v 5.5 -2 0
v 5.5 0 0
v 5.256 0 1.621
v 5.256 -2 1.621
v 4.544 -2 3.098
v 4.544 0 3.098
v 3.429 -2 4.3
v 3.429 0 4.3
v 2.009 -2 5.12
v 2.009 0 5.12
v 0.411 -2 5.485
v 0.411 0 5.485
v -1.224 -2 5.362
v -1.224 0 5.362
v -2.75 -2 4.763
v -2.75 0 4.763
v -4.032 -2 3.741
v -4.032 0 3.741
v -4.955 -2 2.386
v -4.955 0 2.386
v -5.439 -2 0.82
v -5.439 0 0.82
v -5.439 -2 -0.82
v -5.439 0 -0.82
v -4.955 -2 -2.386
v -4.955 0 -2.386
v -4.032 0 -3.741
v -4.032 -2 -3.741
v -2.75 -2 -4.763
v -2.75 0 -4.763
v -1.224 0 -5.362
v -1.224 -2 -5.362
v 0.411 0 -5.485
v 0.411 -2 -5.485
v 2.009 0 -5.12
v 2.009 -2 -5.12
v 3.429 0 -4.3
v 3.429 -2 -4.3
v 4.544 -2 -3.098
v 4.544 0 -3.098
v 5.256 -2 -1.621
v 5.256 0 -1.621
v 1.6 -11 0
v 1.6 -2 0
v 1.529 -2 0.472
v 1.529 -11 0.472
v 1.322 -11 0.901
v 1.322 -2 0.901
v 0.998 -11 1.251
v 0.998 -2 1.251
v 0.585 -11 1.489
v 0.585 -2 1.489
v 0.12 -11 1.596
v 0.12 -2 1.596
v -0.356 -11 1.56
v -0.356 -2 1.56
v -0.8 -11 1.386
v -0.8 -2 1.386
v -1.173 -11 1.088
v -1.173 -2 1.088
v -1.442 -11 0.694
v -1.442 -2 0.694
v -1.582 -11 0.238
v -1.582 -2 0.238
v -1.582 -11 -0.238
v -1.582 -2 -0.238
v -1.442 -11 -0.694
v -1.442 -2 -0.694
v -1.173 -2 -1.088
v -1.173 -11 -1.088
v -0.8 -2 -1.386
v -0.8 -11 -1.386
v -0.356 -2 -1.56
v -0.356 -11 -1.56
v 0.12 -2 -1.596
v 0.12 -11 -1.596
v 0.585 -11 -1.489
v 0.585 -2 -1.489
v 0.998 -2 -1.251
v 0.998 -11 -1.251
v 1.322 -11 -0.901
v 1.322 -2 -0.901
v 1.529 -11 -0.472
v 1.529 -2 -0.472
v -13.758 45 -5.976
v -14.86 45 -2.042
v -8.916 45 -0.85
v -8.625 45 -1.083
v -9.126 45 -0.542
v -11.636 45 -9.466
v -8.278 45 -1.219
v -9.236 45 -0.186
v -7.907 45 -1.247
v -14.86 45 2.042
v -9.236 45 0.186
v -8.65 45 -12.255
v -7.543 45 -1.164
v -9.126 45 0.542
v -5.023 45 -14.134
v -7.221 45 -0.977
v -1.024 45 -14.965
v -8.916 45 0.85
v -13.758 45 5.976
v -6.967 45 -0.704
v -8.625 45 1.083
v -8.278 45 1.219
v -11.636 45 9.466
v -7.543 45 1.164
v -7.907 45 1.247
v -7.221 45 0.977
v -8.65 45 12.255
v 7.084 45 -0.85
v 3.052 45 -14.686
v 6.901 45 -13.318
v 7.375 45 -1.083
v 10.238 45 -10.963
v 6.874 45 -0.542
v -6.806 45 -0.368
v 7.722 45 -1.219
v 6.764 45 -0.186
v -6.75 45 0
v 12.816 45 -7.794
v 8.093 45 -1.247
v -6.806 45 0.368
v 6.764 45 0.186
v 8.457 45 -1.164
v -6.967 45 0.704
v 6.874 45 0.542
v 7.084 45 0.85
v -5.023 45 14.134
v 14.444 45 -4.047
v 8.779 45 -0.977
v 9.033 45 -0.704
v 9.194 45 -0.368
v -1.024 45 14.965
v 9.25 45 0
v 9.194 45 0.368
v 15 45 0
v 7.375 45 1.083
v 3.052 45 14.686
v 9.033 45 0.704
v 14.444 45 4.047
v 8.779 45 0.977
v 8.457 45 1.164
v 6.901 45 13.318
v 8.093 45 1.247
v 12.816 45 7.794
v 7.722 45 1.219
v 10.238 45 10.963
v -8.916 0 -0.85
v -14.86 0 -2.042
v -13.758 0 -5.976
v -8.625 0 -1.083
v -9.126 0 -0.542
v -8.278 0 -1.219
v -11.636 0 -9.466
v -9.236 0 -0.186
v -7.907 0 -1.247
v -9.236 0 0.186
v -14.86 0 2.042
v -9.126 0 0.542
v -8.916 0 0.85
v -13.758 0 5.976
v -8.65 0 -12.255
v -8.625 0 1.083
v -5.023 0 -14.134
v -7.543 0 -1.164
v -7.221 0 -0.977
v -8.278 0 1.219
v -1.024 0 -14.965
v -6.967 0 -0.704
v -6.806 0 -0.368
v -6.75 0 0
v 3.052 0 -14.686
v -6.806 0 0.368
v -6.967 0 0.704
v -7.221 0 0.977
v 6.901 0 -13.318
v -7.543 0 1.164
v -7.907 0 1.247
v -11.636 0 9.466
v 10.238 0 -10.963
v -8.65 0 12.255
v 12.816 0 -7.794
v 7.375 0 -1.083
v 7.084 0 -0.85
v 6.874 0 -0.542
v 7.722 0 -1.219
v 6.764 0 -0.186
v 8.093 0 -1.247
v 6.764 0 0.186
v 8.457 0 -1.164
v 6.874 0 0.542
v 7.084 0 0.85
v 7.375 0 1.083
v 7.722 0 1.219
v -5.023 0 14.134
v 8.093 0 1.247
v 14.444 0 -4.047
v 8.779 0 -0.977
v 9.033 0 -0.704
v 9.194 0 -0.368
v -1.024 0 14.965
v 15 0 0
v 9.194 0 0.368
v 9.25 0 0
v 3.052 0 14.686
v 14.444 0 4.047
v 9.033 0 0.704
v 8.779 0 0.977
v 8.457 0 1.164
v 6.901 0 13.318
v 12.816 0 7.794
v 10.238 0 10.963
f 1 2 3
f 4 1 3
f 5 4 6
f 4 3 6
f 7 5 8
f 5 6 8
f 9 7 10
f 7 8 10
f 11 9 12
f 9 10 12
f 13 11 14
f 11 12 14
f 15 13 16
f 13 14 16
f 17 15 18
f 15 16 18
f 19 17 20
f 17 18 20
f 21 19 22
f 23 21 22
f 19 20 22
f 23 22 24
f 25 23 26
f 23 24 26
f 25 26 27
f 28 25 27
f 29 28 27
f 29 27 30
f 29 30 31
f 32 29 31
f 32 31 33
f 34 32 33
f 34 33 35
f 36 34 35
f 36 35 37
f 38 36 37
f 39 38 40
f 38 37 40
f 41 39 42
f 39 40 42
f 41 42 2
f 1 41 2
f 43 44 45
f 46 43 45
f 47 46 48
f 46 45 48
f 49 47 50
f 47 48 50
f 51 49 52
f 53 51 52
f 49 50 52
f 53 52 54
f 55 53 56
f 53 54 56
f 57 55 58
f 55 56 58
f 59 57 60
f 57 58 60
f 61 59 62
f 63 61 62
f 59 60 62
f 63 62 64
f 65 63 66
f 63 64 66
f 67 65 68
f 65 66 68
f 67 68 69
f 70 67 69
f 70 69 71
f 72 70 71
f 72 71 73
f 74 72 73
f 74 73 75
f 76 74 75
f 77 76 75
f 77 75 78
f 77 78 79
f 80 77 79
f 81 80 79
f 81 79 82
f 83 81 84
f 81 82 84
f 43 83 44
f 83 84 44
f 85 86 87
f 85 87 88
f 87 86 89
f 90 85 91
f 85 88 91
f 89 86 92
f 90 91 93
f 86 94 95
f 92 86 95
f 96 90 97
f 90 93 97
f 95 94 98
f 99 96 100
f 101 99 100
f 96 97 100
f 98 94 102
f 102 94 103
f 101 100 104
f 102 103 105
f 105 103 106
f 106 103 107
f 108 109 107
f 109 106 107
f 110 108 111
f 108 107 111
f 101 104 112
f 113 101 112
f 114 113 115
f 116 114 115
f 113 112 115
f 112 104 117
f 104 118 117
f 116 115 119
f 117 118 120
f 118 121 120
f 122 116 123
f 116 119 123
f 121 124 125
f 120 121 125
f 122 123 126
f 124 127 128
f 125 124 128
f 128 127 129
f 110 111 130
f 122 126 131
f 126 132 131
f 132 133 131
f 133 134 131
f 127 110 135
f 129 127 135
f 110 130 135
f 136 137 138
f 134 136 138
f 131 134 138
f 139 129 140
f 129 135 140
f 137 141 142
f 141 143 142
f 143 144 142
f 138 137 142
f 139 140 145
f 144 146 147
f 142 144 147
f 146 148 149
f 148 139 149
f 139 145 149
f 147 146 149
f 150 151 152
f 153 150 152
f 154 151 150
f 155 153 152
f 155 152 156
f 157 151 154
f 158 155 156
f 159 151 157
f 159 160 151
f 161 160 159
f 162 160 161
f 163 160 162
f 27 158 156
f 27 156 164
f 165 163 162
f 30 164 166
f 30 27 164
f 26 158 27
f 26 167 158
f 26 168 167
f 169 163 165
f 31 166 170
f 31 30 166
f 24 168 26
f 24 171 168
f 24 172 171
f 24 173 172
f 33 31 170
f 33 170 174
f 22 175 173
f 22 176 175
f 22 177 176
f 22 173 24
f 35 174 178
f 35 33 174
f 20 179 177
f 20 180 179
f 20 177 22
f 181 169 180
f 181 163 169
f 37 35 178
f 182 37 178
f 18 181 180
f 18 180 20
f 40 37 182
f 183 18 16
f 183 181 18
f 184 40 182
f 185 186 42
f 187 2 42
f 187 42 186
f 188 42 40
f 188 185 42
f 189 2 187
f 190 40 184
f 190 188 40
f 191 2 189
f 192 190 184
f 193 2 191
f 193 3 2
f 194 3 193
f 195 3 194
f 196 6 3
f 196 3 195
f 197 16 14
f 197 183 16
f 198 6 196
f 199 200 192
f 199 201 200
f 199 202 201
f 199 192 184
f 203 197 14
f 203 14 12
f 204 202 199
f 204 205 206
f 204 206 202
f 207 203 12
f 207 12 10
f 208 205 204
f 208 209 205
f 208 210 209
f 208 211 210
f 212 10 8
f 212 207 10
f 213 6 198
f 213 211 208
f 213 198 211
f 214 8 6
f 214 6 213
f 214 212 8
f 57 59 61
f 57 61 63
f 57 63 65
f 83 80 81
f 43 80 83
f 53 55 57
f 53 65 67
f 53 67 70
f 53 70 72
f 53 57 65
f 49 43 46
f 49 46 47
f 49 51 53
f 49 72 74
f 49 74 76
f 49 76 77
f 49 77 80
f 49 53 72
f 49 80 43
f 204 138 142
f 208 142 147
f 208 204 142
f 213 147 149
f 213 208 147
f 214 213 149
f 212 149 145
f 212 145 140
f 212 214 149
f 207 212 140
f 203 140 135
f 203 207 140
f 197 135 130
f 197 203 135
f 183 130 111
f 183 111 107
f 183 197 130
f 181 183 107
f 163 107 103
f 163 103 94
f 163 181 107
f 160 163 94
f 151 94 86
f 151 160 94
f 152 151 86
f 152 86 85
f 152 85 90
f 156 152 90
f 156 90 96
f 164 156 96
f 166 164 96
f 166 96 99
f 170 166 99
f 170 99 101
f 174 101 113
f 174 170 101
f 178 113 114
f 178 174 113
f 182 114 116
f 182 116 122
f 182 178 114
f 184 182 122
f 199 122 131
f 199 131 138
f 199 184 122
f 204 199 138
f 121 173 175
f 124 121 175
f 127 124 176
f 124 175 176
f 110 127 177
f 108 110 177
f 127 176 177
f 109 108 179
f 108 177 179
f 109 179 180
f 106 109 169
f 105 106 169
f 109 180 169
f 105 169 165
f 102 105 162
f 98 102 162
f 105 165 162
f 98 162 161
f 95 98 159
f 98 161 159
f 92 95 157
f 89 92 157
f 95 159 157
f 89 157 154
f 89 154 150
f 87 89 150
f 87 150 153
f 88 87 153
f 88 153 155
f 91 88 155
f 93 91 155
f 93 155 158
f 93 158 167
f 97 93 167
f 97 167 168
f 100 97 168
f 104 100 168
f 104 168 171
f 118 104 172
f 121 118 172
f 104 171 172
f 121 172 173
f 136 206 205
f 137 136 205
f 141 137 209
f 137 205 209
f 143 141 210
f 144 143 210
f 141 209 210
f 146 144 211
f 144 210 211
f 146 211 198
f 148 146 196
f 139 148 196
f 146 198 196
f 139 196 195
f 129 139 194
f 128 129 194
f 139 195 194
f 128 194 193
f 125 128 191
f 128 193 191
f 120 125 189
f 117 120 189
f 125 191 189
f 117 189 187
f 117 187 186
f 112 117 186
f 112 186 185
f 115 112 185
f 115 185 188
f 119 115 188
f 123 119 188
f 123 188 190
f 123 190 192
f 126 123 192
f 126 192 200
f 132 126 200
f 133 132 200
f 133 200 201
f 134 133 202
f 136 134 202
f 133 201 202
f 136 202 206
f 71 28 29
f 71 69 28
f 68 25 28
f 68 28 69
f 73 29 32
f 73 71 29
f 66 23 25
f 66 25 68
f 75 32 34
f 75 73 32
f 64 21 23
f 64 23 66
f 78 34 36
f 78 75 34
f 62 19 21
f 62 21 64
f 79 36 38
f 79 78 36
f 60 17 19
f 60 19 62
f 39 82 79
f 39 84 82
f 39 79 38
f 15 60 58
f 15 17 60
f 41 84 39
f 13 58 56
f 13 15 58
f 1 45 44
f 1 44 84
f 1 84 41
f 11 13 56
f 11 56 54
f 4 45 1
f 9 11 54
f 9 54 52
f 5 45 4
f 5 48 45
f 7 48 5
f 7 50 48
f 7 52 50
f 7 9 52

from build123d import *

# Parameters (mm, degrees)
F0_R     = 15
F0_R_2   = 1.25
F0_R_3   = 5.5
F1_DEPTH = 45
F2_DEPTH = 2
F3_R     = 1.6
F4_DEPTH = 9


with BuildPart() as f1:
    # F0 (on Front) → F1 (new body)
    with BuildSketch(Plane.XZ):
        Circle(F0_R)
        with Locations((-8, 0)):
            Circle(F0_R_2, mode=Mode.SUBTRACT)
        Circle(F0_R_3, mode=Mode.SUBTRACT)
        with Locations((8, 0)):
            Circle(F0_R_2, mode=Mode.SUBTRACT)
        Circle(F0_R_3)
    extrude(amount=-F1_DEPTH)

    # F0 (on Front) → F2 (join)
    with BuildSketch(Plane.XZ):
        Circle(F0_R_3)
    extrude(amount=F2_DEPTH)

    # F3 (on face) → F4 (join)
    with BuildSketch(Plane.XZ.offset(2)):
        Circle(F3_R)
    extrude(amount=F4_DEPTH)


solid = f1.part
